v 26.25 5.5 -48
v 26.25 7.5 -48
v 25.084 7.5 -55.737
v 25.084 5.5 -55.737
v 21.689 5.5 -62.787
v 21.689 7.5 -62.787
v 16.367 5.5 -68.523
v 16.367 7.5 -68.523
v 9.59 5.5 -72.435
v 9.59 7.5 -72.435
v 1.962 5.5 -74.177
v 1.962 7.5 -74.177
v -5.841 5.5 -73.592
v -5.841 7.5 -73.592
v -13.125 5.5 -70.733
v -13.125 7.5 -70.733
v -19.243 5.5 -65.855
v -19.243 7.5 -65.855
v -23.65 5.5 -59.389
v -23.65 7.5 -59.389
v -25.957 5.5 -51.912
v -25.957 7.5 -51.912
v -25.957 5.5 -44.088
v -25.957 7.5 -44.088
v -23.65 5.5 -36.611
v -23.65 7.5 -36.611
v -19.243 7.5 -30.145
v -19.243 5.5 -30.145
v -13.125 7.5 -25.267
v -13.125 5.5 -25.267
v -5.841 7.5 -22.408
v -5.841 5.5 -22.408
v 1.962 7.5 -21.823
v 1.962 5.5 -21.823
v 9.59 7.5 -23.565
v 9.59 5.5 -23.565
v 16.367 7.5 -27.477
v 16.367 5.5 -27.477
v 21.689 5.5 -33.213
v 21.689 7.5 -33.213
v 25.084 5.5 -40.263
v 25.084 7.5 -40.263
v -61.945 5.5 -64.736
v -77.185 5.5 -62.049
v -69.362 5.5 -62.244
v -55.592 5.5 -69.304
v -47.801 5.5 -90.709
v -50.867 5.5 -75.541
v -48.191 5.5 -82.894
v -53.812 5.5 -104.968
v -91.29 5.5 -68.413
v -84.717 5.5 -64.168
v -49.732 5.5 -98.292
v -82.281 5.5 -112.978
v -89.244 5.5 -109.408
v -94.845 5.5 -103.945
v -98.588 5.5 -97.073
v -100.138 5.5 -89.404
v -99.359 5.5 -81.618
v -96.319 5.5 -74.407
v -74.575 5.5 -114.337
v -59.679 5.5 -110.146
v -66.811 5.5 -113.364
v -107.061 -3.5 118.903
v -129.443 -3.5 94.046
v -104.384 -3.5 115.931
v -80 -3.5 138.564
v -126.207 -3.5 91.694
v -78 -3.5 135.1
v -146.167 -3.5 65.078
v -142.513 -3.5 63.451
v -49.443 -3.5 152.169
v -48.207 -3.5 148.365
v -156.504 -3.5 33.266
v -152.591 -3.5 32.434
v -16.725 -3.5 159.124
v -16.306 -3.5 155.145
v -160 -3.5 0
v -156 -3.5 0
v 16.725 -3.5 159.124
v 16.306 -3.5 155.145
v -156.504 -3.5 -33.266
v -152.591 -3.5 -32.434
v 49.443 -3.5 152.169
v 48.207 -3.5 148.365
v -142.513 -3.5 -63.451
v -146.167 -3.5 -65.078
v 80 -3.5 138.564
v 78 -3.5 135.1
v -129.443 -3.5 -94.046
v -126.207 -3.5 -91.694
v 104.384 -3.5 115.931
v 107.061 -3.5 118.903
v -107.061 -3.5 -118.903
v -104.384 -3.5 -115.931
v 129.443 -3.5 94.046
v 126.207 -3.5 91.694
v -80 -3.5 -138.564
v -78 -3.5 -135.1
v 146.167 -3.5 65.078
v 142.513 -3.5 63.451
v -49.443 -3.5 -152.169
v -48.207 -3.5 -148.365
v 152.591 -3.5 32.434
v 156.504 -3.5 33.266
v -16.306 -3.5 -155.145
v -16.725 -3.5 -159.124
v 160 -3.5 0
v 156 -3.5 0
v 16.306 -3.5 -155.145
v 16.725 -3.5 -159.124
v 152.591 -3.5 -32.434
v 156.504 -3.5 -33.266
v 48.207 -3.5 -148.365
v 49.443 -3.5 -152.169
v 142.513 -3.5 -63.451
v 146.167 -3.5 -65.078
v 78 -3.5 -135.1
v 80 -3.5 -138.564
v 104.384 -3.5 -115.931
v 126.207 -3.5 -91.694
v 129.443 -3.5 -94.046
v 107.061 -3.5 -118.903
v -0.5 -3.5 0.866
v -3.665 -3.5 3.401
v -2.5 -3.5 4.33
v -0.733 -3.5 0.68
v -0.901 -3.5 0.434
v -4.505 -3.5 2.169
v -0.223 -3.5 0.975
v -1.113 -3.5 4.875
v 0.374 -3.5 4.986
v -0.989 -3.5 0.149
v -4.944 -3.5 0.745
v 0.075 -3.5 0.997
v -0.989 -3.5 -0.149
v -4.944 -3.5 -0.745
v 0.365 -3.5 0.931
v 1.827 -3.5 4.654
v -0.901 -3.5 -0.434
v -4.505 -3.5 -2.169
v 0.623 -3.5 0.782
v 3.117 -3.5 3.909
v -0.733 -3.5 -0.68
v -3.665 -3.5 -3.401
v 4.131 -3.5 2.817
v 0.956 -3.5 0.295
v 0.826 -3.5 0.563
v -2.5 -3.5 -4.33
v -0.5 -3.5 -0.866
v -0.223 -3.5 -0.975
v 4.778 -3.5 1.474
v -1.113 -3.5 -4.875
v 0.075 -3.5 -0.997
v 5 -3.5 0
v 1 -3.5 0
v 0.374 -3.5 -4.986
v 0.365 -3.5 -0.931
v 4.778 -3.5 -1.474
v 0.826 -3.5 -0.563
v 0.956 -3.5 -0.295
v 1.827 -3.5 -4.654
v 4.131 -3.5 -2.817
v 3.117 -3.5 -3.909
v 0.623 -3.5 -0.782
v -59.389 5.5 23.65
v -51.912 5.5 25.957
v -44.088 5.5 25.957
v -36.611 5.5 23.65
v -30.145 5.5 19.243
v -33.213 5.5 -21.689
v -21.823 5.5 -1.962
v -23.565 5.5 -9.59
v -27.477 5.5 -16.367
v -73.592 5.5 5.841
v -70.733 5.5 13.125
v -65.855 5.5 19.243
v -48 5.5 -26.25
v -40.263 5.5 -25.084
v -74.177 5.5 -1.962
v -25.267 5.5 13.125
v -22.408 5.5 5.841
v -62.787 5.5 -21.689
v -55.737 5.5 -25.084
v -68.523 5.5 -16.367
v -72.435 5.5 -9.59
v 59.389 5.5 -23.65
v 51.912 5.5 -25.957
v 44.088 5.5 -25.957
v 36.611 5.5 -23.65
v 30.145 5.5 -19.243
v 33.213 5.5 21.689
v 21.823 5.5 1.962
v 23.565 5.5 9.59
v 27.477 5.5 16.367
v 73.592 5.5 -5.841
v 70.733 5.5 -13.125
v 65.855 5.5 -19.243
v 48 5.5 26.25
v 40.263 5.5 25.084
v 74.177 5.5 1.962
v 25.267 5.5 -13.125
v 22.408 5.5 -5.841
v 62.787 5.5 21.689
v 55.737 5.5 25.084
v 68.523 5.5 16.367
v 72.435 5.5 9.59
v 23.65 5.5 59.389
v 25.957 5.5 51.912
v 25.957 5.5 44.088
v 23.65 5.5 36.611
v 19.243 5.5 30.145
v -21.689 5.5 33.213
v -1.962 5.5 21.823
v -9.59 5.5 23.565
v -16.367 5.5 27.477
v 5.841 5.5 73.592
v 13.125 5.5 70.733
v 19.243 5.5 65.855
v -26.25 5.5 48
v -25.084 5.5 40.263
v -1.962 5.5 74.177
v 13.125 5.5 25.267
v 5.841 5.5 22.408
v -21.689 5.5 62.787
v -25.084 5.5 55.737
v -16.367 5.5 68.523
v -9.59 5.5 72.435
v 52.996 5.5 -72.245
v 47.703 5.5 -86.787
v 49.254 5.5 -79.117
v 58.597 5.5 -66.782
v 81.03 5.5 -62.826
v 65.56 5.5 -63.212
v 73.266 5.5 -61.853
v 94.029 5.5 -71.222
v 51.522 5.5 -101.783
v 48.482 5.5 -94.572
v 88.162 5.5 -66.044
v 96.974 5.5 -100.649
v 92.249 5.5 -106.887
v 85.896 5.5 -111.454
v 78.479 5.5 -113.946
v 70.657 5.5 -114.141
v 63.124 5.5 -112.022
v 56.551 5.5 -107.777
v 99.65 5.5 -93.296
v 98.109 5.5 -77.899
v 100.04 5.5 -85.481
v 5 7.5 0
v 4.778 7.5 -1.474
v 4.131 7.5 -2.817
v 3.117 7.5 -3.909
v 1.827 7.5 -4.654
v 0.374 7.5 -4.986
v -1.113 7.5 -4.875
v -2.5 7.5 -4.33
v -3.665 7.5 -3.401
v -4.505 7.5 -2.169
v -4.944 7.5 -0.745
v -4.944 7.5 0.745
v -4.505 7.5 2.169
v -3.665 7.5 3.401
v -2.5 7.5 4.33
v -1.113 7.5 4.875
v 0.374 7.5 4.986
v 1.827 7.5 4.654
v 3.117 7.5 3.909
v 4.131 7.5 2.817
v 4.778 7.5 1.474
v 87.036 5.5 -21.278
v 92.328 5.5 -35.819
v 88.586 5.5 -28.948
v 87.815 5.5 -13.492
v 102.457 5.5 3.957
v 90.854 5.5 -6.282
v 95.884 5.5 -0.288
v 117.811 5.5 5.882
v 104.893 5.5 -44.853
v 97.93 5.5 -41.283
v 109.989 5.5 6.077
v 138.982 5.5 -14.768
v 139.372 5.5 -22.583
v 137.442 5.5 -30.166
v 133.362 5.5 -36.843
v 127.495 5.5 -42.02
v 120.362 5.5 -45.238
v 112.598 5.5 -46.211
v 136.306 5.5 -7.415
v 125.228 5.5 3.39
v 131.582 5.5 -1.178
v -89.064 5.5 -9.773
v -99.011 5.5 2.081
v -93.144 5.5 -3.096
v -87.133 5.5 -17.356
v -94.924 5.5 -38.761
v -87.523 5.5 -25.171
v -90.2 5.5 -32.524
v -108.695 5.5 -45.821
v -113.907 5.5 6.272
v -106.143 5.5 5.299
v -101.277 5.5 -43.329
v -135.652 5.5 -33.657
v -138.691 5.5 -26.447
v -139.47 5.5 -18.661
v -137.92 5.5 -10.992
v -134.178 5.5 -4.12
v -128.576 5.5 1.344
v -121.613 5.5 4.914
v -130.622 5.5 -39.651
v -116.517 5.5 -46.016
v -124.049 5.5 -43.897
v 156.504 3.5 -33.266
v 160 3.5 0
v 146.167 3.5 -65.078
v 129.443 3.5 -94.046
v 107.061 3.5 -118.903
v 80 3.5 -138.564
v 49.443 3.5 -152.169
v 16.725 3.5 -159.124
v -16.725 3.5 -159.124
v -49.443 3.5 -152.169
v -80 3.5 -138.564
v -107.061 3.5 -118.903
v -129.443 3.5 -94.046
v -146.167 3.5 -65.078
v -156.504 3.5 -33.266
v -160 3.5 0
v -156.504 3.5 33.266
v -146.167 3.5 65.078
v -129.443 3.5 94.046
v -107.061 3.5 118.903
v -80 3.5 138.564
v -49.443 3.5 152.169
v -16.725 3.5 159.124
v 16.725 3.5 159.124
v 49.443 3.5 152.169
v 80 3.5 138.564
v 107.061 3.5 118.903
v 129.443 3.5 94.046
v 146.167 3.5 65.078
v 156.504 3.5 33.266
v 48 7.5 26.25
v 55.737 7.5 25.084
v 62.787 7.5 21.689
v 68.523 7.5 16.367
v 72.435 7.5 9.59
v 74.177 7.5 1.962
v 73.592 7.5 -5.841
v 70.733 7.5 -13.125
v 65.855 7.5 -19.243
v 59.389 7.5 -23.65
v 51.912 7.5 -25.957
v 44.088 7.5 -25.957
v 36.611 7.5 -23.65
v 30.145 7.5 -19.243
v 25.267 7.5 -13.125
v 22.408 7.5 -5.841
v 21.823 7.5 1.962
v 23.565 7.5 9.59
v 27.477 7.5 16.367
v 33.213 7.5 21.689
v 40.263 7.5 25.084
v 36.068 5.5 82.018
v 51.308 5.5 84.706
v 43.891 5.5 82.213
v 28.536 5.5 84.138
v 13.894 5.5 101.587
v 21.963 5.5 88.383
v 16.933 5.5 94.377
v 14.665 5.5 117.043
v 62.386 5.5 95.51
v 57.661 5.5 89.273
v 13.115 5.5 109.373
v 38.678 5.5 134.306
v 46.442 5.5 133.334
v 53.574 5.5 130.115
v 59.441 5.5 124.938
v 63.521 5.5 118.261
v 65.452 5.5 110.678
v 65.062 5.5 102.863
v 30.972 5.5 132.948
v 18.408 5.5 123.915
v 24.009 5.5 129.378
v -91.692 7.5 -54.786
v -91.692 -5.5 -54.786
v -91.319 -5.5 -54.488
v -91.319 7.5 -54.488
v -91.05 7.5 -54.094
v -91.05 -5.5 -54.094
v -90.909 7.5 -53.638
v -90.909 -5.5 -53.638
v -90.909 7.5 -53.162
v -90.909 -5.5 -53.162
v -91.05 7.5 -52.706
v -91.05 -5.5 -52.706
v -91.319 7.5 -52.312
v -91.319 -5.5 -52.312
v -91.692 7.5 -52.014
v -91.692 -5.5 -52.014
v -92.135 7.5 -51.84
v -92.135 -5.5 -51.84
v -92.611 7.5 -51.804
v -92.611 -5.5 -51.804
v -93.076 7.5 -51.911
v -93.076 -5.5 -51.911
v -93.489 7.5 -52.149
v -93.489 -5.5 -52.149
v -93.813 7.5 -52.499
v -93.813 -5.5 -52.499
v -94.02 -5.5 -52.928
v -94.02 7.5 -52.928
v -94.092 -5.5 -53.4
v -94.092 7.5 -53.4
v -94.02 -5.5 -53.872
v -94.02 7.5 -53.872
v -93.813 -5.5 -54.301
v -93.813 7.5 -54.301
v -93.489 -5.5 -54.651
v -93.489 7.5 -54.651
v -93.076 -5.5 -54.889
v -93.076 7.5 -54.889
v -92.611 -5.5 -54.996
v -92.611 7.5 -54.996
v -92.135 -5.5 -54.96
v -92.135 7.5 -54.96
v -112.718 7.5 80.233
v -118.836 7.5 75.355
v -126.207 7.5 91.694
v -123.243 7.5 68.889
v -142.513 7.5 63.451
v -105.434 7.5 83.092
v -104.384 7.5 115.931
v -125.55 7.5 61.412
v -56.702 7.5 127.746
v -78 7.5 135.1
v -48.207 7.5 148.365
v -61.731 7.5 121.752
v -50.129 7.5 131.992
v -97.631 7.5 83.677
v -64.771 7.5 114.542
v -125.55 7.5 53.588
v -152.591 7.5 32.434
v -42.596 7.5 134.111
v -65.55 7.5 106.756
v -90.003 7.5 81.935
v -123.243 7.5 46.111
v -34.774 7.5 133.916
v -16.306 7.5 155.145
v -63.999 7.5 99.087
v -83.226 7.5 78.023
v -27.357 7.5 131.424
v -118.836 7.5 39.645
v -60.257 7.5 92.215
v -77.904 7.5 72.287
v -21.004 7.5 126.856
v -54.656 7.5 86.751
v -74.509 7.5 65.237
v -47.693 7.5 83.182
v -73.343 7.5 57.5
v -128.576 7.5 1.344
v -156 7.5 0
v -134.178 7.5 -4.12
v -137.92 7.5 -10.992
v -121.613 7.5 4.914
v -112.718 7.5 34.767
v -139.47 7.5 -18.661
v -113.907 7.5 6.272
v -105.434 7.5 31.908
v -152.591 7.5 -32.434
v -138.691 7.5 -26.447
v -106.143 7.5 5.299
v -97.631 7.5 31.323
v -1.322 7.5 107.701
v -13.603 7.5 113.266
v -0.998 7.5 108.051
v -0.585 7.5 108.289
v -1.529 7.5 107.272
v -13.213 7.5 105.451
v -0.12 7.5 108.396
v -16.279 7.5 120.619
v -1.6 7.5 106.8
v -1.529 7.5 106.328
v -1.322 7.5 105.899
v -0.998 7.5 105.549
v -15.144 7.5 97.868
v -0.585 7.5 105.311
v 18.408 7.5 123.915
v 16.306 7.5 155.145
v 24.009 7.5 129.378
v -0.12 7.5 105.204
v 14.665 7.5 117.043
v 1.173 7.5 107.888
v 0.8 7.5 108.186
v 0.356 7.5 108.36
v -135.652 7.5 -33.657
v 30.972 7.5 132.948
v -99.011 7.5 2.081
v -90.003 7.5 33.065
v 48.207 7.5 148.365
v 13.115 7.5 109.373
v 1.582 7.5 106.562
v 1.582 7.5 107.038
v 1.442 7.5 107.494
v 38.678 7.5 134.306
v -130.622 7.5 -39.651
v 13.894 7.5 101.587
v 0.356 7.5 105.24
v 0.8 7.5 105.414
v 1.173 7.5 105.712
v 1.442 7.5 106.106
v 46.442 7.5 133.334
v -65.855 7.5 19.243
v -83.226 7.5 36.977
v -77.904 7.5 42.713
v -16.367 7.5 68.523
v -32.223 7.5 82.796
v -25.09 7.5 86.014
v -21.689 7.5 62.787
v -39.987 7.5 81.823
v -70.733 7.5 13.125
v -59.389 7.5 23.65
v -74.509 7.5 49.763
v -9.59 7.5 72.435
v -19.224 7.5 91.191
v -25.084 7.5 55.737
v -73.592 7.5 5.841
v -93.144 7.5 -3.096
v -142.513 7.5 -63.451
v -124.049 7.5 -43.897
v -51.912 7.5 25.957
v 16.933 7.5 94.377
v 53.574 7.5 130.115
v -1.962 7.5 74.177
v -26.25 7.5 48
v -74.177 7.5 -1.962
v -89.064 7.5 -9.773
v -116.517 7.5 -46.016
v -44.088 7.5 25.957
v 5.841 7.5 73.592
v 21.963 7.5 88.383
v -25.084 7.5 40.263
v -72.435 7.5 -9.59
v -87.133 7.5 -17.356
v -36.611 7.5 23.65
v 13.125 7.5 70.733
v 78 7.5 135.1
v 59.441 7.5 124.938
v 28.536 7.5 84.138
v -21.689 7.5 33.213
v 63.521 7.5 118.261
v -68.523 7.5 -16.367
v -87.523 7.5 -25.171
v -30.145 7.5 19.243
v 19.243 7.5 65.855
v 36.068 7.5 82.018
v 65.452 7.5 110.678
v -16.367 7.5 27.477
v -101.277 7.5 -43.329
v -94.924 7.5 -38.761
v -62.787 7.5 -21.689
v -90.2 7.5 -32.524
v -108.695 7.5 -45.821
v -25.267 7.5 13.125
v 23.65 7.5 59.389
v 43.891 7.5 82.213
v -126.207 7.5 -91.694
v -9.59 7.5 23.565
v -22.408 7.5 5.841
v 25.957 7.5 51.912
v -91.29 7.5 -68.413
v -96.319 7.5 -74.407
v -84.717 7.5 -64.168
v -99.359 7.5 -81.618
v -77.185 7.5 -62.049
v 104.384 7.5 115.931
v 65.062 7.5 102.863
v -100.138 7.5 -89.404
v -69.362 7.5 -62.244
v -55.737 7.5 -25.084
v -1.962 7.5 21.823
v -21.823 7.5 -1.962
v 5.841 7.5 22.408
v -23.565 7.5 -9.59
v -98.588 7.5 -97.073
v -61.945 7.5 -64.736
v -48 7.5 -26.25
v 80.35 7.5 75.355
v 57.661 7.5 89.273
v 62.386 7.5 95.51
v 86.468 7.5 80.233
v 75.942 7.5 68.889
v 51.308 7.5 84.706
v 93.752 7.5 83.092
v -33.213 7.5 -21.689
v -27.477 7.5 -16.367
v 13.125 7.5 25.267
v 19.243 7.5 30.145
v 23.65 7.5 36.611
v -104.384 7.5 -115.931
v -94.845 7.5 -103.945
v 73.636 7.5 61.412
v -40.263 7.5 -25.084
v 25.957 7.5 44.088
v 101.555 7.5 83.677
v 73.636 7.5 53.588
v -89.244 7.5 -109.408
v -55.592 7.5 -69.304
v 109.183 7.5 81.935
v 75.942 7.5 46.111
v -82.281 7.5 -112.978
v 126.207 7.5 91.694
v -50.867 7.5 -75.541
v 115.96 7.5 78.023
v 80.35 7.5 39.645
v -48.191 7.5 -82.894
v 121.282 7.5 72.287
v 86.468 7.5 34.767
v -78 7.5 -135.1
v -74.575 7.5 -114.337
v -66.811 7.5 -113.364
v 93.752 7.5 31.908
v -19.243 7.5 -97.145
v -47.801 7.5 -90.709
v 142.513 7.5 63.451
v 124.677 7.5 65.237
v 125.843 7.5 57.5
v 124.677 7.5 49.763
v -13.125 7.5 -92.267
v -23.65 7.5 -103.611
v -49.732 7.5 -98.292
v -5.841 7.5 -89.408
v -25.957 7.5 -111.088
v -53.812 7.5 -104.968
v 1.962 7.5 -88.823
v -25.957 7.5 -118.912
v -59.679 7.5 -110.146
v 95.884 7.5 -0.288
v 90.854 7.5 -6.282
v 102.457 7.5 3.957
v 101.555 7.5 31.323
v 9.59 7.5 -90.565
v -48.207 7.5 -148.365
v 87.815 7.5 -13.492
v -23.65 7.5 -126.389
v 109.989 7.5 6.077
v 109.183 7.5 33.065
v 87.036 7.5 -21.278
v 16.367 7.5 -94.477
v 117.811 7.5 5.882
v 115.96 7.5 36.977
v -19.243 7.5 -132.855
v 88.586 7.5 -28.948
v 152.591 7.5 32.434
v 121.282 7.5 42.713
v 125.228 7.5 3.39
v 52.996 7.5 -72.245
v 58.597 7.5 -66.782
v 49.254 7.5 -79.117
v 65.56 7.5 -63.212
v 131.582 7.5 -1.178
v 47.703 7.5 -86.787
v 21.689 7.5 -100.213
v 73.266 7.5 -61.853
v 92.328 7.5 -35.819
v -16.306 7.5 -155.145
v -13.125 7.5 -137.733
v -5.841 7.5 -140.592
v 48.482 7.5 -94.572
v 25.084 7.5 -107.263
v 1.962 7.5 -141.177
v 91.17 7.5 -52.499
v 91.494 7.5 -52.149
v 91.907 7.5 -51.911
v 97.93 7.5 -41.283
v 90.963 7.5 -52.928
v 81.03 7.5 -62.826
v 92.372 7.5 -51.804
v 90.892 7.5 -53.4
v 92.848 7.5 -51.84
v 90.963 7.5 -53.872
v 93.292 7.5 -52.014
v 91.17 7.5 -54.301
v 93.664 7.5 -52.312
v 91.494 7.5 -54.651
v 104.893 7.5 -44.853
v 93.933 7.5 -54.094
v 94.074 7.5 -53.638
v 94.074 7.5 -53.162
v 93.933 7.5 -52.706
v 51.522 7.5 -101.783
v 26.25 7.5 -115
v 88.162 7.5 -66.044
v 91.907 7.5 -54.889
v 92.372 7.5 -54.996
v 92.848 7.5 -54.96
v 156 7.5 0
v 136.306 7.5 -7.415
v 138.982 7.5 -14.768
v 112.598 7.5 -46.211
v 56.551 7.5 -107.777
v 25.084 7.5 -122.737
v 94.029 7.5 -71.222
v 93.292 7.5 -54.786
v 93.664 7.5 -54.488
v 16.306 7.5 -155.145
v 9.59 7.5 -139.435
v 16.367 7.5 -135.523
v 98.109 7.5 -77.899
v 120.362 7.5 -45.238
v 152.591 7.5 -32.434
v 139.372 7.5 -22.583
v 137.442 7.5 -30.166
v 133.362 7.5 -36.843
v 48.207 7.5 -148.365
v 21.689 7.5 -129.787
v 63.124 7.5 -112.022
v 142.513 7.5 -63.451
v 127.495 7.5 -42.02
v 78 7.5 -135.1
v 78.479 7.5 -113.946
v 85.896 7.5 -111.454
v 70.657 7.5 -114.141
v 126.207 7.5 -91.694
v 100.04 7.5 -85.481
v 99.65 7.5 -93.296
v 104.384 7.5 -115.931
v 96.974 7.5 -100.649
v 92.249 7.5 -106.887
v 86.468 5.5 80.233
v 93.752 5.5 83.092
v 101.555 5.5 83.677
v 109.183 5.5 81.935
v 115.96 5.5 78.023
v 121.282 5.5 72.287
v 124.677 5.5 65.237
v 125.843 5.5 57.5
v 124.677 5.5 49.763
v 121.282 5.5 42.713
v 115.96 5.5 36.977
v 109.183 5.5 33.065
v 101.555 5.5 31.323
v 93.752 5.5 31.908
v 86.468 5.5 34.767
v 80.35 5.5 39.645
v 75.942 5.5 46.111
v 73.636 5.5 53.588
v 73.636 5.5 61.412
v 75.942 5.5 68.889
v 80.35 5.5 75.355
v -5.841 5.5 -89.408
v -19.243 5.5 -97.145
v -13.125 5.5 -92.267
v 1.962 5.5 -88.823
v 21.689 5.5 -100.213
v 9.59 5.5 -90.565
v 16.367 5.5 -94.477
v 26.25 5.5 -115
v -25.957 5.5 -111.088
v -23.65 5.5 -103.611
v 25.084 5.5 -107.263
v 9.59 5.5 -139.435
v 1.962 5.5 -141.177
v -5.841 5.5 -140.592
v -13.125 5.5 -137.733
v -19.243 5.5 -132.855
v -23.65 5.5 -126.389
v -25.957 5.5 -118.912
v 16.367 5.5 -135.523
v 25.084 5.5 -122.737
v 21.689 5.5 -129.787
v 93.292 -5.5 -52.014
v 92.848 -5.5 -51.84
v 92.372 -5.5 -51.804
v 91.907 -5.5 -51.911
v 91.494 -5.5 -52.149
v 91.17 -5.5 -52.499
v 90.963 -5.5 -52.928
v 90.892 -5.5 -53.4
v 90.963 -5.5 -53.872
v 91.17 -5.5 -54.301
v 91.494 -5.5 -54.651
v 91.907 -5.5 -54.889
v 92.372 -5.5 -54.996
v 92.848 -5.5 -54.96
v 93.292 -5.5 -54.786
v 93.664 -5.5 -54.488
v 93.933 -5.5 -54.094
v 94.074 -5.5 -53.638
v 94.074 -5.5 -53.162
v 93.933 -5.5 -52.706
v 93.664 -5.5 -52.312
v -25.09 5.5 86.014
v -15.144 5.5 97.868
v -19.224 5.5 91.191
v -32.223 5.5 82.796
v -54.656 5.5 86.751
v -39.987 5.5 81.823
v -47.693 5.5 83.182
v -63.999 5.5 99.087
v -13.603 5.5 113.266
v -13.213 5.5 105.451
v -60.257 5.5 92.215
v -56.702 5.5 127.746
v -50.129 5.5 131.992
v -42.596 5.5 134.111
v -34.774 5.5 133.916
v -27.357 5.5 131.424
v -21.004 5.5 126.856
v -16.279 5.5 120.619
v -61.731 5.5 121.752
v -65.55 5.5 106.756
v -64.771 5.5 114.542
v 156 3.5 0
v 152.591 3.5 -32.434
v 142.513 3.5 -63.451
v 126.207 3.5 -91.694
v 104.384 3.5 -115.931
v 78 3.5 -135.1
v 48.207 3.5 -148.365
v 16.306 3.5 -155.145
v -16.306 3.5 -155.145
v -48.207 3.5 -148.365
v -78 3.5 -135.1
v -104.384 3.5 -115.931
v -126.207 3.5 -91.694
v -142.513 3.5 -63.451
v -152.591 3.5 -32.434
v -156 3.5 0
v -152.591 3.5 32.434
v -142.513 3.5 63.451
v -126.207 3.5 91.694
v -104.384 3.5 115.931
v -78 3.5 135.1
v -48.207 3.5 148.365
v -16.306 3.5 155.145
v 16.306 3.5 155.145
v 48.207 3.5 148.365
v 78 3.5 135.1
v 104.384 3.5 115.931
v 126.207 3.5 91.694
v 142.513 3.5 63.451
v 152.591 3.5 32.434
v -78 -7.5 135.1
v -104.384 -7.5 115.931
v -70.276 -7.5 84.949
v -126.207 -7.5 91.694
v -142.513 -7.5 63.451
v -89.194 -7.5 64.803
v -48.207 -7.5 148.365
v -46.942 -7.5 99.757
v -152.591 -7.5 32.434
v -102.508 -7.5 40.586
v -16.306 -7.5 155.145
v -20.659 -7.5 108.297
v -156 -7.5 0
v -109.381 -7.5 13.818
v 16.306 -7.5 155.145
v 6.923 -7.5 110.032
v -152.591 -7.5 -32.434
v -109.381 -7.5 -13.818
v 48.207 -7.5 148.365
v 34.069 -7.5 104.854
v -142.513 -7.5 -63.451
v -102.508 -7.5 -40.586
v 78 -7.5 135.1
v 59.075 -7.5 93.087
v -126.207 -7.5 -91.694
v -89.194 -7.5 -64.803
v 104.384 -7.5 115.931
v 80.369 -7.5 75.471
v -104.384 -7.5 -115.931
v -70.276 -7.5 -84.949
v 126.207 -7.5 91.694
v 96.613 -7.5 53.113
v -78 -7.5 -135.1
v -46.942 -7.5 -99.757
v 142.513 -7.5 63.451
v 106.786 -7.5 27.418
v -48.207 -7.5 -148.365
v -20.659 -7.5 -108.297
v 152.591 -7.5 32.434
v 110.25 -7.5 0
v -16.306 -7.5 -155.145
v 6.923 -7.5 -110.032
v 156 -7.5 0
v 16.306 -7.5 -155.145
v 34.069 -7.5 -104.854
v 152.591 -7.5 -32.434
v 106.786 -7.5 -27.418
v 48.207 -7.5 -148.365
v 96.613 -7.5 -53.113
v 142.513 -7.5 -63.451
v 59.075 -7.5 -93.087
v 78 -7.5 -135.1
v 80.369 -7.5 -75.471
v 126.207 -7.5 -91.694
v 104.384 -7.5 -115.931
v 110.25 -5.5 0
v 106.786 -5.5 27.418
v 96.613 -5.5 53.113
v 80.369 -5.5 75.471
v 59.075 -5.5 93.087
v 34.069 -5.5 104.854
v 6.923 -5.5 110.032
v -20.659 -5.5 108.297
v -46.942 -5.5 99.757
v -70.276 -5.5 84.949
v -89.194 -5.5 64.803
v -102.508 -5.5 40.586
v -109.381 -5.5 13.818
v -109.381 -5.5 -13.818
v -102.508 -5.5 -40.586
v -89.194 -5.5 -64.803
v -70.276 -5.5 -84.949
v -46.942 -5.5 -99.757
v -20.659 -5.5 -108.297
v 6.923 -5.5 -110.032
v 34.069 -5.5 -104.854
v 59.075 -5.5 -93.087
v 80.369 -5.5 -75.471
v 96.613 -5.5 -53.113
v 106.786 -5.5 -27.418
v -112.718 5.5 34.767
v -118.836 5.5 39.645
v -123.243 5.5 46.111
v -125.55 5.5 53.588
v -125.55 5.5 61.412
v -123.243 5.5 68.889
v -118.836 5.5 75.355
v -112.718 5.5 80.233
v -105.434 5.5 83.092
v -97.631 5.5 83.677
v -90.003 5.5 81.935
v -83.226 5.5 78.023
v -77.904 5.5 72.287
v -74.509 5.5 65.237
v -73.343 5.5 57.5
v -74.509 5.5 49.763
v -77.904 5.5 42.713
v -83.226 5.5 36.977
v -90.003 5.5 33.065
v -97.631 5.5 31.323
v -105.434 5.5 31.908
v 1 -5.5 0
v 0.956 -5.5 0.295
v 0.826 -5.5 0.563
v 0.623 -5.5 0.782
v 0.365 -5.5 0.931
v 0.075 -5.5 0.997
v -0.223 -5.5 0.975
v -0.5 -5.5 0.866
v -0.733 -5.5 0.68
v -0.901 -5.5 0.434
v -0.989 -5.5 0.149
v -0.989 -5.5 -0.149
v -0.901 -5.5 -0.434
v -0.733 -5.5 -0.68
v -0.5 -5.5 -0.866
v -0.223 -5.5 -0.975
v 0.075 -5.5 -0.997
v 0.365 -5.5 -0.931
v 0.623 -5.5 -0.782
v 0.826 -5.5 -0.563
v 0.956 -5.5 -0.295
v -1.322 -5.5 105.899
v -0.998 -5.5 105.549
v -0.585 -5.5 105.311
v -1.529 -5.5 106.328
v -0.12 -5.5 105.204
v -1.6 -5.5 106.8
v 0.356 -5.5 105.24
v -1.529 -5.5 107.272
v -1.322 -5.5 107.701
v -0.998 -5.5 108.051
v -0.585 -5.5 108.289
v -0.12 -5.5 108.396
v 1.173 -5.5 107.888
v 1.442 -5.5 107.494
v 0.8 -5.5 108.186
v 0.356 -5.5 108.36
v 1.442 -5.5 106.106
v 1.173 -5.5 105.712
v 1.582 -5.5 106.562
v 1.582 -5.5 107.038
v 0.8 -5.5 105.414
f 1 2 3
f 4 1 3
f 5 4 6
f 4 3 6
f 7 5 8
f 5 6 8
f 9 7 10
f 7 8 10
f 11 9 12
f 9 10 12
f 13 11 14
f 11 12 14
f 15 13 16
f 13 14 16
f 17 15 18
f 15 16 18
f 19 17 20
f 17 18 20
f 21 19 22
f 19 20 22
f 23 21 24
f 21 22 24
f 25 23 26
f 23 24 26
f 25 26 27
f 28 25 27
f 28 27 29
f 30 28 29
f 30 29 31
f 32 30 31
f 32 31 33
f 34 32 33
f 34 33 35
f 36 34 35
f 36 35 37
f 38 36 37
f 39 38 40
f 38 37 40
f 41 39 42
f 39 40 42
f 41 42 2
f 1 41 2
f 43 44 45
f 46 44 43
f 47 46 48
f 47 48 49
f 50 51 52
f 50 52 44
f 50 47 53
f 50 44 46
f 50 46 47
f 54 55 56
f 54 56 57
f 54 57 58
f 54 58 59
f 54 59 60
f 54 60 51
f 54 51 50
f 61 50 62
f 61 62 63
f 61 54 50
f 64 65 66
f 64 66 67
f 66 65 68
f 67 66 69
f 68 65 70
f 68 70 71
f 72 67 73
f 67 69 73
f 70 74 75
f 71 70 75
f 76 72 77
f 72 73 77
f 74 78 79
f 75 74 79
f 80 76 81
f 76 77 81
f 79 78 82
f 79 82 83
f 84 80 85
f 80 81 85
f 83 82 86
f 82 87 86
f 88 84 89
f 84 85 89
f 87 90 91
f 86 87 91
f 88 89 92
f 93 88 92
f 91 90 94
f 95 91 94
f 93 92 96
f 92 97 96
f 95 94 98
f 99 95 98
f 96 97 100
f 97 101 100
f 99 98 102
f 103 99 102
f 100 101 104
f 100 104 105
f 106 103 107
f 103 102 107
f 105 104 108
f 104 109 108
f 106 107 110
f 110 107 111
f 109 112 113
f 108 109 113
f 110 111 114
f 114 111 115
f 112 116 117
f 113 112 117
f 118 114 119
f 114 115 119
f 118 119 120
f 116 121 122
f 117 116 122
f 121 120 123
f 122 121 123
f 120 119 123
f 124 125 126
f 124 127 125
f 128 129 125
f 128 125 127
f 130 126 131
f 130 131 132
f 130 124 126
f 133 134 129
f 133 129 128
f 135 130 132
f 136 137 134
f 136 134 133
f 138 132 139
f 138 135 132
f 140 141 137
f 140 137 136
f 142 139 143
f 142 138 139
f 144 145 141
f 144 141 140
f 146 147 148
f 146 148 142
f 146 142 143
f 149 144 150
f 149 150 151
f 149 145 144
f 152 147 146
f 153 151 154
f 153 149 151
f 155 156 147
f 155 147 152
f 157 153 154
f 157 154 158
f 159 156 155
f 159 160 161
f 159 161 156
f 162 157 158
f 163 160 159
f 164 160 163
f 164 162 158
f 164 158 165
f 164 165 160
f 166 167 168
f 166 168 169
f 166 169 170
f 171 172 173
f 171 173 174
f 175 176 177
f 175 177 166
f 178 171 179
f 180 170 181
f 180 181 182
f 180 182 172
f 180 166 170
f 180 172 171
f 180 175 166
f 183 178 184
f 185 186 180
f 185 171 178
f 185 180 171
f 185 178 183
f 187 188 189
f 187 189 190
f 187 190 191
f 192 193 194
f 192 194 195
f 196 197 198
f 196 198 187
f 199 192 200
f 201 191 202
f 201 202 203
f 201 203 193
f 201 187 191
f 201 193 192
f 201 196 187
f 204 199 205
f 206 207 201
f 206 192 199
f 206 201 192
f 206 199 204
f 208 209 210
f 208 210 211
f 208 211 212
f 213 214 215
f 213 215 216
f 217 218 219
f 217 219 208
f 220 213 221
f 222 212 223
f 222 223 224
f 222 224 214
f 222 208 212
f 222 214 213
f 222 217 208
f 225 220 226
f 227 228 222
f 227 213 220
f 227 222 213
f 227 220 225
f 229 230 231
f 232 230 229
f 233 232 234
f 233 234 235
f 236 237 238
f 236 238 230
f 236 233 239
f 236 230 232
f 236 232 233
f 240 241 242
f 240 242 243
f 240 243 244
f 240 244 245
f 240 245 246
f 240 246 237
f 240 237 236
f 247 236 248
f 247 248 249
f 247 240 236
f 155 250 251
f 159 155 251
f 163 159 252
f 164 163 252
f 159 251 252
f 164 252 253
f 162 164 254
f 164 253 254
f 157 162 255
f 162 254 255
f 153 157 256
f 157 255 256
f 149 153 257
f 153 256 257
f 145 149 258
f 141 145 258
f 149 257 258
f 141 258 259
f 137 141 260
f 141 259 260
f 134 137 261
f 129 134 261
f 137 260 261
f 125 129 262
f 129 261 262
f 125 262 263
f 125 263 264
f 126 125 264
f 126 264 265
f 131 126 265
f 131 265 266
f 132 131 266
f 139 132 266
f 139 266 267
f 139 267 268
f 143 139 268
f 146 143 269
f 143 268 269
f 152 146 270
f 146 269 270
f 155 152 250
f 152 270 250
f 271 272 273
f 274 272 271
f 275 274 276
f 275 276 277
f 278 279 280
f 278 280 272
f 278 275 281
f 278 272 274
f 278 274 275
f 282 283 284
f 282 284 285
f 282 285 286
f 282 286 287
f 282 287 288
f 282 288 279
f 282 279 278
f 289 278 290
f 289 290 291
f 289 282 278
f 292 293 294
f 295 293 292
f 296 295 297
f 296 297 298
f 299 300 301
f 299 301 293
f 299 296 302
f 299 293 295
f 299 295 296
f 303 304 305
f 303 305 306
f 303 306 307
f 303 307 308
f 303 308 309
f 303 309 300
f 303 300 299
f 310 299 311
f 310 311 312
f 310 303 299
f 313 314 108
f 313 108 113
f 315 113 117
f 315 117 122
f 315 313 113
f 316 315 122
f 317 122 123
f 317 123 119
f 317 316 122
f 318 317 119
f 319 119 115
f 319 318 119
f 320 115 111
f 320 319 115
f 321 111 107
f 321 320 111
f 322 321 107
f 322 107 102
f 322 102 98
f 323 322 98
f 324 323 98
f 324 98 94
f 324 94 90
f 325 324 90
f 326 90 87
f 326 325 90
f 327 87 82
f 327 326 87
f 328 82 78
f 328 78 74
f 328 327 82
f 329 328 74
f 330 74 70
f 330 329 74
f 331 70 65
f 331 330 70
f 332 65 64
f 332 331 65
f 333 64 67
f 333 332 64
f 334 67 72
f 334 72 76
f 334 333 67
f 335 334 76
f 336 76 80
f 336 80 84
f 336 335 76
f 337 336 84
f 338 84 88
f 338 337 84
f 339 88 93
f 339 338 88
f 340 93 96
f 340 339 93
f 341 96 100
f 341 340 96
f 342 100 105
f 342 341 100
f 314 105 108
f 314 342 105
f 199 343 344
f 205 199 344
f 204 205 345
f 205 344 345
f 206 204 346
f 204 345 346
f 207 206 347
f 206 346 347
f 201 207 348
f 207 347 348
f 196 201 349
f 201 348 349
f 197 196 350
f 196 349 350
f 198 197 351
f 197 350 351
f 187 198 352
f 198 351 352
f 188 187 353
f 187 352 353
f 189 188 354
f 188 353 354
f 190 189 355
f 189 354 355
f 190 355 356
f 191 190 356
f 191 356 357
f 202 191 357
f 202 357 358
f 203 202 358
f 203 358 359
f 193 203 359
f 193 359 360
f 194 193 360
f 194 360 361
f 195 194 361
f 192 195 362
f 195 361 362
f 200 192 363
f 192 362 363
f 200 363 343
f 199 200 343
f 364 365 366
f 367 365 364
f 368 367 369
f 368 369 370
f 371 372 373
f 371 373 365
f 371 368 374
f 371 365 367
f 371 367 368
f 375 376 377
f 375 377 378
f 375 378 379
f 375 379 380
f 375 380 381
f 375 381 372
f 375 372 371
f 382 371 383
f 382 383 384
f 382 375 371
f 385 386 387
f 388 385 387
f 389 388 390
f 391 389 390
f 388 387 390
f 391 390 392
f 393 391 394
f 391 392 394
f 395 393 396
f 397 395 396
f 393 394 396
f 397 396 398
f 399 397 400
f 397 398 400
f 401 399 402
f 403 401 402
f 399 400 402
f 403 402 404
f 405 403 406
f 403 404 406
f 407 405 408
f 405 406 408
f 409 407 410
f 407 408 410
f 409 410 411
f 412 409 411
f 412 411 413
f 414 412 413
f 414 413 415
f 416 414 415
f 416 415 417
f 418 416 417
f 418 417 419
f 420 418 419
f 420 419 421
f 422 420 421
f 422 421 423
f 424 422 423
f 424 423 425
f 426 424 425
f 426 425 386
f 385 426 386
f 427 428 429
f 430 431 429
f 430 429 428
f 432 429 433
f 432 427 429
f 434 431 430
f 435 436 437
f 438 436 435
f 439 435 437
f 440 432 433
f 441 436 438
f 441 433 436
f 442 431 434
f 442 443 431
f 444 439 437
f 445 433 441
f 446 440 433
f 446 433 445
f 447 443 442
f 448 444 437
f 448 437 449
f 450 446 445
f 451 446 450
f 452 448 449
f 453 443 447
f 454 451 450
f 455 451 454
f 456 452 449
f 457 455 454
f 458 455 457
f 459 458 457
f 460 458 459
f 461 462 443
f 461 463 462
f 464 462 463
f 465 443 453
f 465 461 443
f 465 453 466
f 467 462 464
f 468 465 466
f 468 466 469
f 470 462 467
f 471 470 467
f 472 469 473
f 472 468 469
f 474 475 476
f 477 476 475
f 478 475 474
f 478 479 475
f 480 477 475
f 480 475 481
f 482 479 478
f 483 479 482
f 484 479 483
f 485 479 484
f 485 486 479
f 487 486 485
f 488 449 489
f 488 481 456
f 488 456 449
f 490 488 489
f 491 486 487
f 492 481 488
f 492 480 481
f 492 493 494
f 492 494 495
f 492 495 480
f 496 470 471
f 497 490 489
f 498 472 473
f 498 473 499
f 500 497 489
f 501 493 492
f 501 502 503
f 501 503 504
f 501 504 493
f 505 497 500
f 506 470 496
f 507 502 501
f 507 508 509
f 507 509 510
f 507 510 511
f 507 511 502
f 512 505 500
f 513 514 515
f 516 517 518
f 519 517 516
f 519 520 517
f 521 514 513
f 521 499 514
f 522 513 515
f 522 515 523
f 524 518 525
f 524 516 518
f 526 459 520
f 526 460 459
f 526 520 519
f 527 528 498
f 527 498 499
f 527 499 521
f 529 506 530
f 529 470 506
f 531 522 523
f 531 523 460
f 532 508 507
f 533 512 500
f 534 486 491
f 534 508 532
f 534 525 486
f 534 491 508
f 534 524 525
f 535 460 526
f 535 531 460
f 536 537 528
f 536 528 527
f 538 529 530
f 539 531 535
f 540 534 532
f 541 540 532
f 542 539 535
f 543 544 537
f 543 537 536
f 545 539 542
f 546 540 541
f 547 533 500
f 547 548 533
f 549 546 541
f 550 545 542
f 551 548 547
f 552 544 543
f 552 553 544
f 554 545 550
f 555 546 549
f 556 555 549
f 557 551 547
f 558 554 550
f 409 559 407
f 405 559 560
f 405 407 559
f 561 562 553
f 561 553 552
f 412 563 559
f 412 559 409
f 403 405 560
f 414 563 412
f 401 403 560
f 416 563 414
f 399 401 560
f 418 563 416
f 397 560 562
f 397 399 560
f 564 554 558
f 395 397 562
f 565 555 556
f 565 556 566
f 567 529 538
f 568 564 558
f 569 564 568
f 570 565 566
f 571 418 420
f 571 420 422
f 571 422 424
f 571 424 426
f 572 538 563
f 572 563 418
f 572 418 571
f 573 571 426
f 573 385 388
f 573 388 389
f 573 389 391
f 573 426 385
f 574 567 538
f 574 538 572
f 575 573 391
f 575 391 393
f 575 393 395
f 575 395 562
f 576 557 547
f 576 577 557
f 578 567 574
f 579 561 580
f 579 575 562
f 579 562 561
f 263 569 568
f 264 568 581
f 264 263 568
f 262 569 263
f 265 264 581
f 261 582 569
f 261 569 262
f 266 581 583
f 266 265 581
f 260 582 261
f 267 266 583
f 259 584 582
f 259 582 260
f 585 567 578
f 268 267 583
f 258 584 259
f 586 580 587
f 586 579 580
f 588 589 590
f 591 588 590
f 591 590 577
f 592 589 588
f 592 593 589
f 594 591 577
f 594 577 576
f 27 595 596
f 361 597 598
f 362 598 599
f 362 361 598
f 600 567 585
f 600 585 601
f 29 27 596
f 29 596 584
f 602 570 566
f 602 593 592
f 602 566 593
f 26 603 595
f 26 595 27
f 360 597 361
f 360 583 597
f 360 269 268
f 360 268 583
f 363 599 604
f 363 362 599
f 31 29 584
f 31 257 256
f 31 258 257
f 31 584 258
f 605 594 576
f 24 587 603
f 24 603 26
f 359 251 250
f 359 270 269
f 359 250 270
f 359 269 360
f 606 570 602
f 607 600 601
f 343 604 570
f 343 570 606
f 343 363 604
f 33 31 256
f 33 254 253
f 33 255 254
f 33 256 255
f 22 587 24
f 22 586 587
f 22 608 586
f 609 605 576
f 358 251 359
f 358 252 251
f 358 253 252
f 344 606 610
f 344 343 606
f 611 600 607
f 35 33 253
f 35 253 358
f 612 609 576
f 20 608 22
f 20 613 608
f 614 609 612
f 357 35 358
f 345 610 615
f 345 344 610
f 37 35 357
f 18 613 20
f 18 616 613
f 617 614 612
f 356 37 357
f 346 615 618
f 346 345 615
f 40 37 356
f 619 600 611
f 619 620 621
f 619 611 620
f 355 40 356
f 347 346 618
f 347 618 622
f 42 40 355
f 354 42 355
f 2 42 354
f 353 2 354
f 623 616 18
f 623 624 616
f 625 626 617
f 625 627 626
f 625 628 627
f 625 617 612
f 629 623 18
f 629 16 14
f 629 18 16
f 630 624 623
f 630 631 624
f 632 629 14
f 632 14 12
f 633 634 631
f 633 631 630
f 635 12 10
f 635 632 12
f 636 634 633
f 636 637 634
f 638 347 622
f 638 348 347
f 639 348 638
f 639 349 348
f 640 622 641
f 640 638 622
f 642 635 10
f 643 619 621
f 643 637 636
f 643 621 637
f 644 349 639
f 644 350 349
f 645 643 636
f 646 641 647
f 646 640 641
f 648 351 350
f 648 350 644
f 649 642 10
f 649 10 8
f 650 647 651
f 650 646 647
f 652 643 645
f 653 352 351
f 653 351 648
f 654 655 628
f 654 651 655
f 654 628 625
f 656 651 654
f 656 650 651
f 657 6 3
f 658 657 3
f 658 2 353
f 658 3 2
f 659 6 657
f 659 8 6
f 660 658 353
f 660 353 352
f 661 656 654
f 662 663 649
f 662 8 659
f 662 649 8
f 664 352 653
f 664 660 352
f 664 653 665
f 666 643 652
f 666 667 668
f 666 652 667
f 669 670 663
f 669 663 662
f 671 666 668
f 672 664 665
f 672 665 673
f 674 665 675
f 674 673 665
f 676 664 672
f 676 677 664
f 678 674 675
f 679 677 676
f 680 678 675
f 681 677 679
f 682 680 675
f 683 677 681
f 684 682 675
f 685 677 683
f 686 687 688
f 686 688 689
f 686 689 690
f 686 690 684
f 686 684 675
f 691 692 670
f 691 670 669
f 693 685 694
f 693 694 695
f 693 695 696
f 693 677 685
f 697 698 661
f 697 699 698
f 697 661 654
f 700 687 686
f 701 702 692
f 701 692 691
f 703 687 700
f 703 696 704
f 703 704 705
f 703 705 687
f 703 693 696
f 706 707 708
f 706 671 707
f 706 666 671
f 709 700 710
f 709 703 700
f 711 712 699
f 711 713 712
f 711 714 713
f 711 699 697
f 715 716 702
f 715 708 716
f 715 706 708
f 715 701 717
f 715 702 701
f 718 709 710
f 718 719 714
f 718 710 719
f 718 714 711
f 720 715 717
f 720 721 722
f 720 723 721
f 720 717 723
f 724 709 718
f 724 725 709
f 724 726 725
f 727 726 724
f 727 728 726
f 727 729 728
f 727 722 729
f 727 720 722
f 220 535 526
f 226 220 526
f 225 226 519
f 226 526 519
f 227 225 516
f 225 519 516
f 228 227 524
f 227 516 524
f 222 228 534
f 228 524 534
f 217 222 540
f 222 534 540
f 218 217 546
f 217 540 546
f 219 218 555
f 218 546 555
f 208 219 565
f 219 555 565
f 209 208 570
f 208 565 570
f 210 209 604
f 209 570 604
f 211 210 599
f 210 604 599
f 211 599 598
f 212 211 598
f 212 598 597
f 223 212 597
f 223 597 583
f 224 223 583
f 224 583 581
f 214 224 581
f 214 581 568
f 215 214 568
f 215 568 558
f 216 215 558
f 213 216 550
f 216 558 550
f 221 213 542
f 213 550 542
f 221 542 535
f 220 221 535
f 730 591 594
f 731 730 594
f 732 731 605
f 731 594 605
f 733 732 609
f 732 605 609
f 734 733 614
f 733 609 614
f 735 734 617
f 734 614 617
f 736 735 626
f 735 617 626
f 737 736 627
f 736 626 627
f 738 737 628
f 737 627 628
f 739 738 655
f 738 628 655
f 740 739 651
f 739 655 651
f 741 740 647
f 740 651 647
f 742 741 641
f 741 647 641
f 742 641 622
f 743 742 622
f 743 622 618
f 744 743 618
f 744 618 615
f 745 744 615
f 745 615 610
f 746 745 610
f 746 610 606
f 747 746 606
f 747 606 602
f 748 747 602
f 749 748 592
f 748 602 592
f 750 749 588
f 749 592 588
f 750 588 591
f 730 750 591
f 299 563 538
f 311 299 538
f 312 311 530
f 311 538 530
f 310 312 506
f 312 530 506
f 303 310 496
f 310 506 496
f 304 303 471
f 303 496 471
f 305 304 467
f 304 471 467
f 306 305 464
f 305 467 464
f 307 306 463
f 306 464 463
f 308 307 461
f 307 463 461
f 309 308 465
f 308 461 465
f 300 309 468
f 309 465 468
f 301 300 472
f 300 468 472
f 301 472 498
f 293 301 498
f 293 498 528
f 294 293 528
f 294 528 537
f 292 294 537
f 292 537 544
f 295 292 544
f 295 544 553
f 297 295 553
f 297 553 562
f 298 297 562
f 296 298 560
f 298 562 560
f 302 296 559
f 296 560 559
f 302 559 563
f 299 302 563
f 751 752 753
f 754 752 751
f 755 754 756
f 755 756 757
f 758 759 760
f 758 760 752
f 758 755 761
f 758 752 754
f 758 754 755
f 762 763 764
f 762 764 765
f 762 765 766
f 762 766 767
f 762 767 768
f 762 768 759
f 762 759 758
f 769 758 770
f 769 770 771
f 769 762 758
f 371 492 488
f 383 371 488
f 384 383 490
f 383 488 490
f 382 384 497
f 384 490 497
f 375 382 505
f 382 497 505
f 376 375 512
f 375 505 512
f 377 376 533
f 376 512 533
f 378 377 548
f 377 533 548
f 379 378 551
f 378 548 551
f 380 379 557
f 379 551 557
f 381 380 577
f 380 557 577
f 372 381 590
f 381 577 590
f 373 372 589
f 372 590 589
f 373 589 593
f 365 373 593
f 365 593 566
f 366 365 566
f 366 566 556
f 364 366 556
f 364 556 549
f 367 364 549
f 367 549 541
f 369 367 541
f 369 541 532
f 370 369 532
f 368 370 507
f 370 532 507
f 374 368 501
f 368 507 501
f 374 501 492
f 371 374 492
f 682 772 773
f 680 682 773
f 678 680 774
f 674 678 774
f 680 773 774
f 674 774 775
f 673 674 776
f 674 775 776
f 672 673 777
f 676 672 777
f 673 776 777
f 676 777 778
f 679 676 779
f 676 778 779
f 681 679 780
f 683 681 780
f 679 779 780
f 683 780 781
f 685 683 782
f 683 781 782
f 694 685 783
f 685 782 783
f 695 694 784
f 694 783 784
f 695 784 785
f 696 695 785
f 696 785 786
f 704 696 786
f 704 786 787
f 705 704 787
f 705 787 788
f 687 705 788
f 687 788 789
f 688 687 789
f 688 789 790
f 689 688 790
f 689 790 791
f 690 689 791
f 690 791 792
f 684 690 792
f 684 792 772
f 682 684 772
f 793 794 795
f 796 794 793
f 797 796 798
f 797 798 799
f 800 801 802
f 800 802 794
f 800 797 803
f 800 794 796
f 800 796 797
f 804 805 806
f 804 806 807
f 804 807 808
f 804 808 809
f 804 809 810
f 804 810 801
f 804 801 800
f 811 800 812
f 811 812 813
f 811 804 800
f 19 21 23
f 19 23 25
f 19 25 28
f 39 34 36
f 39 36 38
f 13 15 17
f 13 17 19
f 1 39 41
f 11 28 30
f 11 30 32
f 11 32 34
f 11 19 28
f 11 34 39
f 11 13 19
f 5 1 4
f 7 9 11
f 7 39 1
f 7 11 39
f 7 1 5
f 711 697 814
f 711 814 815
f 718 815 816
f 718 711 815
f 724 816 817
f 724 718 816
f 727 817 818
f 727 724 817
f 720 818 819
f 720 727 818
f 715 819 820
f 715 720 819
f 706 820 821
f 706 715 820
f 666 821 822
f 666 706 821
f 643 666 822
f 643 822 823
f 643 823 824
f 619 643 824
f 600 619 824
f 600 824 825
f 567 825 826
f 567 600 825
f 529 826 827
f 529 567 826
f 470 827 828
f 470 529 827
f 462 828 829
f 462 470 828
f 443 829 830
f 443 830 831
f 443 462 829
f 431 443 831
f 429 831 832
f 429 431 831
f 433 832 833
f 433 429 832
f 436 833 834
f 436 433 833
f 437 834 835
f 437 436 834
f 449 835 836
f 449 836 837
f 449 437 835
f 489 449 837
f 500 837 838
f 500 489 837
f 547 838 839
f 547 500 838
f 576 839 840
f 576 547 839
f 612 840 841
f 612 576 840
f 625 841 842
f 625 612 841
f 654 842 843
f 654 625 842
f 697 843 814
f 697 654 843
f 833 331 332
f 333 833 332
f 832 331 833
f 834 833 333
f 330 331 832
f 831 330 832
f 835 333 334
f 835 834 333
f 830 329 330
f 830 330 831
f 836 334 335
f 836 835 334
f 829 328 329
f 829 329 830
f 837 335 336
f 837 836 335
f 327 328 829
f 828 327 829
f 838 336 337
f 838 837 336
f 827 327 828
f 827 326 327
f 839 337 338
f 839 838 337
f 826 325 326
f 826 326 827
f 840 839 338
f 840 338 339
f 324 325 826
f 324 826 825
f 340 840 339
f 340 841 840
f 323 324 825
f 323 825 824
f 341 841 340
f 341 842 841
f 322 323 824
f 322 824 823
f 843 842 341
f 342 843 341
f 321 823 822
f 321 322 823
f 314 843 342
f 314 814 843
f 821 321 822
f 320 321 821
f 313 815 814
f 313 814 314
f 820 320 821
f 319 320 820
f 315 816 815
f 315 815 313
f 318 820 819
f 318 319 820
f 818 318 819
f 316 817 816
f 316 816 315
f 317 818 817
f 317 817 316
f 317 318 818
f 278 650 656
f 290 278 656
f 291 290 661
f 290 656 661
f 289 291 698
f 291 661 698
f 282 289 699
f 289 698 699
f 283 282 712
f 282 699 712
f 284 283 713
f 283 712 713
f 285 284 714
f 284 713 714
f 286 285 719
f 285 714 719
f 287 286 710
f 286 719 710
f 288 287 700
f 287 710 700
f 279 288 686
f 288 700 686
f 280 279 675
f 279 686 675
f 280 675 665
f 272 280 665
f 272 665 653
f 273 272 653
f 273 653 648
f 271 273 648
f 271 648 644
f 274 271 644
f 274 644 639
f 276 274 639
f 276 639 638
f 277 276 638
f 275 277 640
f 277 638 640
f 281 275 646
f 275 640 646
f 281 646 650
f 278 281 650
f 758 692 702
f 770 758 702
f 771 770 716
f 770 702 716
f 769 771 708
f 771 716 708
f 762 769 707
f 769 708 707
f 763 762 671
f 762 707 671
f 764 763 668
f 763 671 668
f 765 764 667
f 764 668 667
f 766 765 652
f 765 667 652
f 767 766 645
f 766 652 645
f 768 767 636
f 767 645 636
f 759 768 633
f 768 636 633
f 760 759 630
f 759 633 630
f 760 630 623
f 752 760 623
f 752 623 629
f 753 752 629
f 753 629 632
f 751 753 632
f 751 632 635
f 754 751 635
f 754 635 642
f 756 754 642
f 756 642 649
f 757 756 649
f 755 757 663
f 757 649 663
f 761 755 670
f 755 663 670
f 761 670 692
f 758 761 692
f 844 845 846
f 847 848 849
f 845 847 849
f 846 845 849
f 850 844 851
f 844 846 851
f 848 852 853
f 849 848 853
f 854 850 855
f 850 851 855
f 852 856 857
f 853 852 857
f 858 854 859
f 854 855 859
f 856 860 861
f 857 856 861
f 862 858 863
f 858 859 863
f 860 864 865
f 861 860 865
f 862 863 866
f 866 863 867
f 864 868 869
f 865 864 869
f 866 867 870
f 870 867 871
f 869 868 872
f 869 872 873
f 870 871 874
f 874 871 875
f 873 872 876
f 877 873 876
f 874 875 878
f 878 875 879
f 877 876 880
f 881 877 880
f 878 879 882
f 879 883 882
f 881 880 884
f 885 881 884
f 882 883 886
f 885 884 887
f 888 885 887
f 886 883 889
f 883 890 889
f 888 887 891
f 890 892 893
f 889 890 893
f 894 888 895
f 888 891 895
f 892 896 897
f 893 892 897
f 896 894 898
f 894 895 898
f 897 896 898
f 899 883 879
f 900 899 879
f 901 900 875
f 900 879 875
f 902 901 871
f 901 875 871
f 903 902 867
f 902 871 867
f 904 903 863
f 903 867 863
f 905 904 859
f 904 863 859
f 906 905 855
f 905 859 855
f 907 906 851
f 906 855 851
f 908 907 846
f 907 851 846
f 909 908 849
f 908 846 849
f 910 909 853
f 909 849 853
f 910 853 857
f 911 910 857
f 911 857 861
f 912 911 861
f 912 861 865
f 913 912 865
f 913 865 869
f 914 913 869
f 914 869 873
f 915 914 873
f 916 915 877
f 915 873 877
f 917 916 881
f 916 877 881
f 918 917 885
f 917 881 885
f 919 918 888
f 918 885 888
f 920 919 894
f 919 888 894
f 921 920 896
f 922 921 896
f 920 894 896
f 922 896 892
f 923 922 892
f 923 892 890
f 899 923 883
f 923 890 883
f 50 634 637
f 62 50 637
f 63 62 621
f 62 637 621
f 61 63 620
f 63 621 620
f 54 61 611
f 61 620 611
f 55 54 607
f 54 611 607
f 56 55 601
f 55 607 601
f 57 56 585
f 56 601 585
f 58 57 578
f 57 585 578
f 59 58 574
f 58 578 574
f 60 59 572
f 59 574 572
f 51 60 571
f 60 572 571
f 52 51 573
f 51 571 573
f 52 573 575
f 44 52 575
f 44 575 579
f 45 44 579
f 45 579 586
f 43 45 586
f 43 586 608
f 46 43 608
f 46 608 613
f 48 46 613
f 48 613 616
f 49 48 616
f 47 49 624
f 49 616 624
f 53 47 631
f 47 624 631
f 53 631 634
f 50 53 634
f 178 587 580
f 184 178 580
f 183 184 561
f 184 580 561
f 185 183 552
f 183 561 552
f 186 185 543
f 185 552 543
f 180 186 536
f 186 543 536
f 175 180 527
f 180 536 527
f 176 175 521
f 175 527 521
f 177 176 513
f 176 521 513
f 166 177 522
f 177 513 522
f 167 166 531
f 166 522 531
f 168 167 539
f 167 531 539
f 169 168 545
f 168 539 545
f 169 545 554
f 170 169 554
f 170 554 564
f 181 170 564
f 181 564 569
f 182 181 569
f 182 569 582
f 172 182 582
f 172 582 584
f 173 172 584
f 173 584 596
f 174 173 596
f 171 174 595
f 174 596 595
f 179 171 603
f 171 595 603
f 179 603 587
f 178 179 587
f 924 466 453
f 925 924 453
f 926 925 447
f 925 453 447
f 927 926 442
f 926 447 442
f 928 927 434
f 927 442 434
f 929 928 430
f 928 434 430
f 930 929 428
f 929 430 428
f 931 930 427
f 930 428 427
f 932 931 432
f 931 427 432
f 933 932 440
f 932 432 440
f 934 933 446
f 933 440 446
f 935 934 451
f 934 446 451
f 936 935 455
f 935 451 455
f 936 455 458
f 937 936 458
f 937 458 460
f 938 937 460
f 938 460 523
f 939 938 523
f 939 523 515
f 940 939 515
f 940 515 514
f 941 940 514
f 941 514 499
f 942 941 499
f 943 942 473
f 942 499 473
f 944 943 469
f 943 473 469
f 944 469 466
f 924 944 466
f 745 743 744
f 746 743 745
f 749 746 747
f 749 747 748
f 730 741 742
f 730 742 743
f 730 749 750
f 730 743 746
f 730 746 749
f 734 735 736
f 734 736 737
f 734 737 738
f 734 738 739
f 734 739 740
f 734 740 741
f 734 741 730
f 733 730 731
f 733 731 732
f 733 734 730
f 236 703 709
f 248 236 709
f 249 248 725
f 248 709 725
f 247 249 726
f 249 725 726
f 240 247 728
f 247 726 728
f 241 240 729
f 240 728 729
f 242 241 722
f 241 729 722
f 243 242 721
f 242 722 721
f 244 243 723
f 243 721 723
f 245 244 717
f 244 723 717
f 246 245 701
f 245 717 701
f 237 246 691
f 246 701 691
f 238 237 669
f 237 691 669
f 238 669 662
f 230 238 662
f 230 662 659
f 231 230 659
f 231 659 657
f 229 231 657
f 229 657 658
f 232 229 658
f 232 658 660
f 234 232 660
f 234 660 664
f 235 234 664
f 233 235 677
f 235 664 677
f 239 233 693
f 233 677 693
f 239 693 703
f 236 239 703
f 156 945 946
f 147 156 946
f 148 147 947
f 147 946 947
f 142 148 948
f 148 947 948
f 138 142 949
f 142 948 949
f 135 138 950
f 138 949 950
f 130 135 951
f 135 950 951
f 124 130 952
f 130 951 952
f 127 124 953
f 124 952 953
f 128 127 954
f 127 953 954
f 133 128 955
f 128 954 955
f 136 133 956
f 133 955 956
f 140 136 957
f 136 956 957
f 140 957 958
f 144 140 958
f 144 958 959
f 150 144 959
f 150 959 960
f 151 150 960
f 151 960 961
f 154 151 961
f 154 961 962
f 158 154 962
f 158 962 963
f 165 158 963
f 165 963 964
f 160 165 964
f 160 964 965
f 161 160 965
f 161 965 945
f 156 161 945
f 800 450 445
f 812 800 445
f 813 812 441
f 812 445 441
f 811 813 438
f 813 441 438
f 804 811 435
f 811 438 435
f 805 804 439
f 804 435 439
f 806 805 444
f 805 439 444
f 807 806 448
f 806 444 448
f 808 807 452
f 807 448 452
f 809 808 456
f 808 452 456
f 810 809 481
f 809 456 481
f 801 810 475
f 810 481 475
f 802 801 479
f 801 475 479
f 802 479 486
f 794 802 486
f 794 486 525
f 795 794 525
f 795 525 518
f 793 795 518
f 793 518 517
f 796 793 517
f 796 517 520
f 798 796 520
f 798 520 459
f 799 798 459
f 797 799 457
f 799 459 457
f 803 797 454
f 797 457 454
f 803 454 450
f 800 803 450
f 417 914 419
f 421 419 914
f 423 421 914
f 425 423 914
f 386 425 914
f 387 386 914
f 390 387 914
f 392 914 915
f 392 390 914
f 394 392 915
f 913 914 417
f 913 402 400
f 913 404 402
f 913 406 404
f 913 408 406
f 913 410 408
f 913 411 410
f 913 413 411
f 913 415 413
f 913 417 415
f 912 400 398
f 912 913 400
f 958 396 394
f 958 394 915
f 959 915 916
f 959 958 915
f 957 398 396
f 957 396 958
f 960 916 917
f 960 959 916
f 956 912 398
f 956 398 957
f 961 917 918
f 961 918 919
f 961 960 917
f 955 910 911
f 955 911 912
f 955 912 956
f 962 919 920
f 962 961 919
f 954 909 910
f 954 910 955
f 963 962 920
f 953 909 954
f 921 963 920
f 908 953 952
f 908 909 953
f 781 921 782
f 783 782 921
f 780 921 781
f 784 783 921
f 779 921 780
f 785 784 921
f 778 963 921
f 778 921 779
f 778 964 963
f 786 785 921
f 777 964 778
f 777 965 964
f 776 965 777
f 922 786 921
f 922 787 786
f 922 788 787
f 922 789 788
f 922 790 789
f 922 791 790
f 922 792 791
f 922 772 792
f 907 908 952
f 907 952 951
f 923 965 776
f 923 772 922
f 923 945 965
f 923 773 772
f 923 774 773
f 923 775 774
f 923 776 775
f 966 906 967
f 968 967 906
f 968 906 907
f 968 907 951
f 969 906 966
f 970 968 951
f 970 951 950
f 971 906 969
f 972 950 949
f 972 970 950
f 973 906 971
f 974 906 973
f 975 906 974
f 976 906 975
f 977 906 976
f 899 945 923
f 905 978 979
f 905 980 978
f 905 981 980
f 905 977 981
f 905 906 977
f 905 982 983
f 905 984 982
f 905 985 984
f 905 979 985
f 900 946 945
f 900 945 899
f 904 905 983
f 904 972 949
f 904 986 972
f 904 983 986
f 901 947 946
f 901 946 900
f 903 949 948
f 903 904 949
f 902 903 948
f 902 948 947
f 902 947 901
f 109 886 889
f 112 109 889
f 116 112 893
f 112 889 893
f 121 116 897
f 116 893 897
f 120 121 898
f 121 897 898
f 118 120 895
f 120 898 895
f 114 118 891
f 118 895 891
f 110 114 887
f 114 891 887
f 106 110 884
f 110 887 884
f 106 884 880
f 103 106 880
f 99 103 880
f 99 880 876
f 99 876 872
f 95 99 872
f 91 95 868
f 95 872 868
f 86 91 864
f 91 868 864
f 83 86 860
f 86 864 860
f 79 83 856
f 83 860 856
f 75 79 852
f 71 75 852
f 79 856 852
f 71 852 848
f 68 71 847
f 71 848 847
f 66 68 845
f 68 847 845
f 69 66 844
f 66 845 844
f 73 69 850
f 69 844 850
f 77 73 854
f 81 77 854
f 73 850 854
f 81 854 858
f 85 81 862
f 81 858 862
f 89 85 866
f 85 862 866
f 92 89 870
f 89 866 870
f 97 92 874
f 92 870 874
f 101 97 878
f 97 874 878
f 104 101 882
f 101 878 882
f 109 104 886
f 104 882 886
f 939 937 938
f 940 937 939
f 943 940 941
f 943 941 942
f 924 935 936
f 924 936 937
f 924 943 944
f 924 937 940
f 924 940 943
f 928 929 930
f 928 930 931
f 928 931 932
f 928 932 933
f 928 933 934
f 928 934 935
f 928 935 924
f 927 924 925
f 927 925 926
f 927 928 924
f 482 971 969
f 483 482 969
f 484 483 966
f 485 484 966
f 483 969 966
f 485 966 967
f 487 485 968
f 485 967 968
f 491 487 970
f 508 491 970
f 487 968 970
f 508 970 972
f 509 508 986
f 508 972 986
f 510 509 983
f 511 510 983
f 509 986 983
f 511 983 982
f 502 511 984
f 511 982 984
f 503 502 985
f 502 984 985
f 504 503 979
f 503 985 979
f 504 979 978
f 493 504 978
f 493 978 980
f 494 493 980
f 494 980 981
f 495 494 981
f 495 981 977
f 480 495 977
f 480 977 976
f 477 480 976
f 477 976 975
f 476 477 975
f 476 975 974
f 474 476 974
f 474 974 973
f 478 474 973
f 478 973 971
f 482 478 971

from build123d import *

# Parameters (mm, degrees)
ESQUISSE1_R                  = 160
BOSS_EXTRU_1_DEPTH           = 7.5
ESQUISSE2_R                  = 110.25
ENL_V_MAT_EXTRU_1_DEPTH      = 2
ESQUISSE3_R                  = 1.6
ENL_V_MAT_EXTRU_2_DEPTH      = 14
R_P_TITION_CIRCULAIRE1_COUNT = 3
ESQUISSE4_R                  = 1
ENL_V_MAT_EXTRU_3_DEPTH      = 14
ESQUISSE10_R                 = 5
ENL_V_MAT_EXTRU_6_DEPTH      = 11
ESQUISSE11_R                 = 160
ESQUISSE11_R_2               = 156
ENL_V_MAT_EXTRU_7_DEPTH      = 4
ESQUISSE8_R                  = 26.25
ENL_V_MAT_EXTRU_4_DEPTH      = 2
R_P_TITION_CIRCULAIRE2_COUNT = 9
ESQUISSE9_R                  = 26.25
ENL_V_MAT_EXTRU_5_DEPTH      = 2
R_P_TITION_CIRCULAIRE3_COUNT = 4


with BuildPart() as part:
    # Esquisse1 → Boss.-Extru.1 (new body, symmetric)
    with BuildSketch(Plane(origin=(0, 0, 0), x_dir=(1, 0, 0), z_dir=(0, 1, 0))):
        Circle(ESQUISSE1_R)
    extrude(amount=BOSS_EXTRU_1_DEPTH, both=True)

    # Esquisse2 → Enlèv. mat.-Extru.1 (cut)
    with BuildSketch(Plane.XZ.offset(7.5)):
        Circle(ESQUISSE2_R)
    extrude(amount=-ENL_V_MAT_EXTRU_1_DEPTH, mode=Mode.SUBTRACT)

    # Esquisse3 → Enlèv. mat.-Extru.2 (cut, through all)
    with BuildSketch(Plane(origin=(0, -5.5, 0), x_dir=(-1, 0, 0), z_dir=(0, -1, 0))):
        with Locations((0, -106.8)):
            Circle(ESQUISSE3_R)
    enl_v_mat_extru_2 = extrude(amount=-ENL_V_MAT_EXTRU_2_DEPTH, mode=Mode.SUBTRACT)

    # Répétition circulaire1: Enlèv. mat.-Extru.2 ×3 about axis
    r_p_tition_circulaire1_axis = Axis((0, 0, 0), (0, 1, 0))
    for i in range(1, R_P_TITION_CIRCULAIRE1_COUNT):
        add(enl_v_mat_extru_2.rotate(r_p_tition_circulaire1_axis, i * 360 / R_P_TITION_CIRCULAIRE1_COUNT), mode=Mode.SUBTRACT)

    # Esquisse4 → Enlèv. mat.-Extru.3 (cut, through all)
    with BuildSketch(Plane.XZ.offset(5.5)):
        Circle(ESQUISSE4_R)
    extrude(amount=-ENL_V_MAT_EXTRU_3_DEPTH, mode=Mode.SUBTRACT)

    # Esquisse10 → Enlèv. mat.-Extru.6 (cut)
    with BuildSketch(Plane(origin=(0, 7.5, 0), x_dir=(1, 0, 0), z_dir=(0, 1, 0))):
        Circle(ESQUISSE10_R)
    extrude(amount=-ENL_V_MAT_EXTRU_6_DEPTH, mode=Mode.SUBTRACT)

    # Esquisse11 → Enlèv. mat.-Extru.7 (cut)
    with BuildSketch(Plane(origin=(0, -7.5, 0), x_dir=(1, 0, 0), z_dir=(0, 1, 0))):
        Circle(ESQUISSE11_R)
        Circle(ESQUISSE11_R_2, mode=Mode.SUBTRACT)
    enl_v_mat_extru_7 = extrude(amount=ENL_V_MAT_EXTRU_7_DEPTH, mode=Mode.SUBTRACT)

    # Symétrie1: Enlèv. mat.-Extru.7 across plane
    add(enl_v_mat_extru_7.mirror(Plane.ZX), mode=Mode.SUBTRACT)

    # Esquisse8 → Enlèv. mat.-Extru.4 (cut)
    with BuildSketch(Plane(origin=(0, 7.5, 0), x_dir=(1, 0, 0), z_dir=(0, 1, 0))):
        with Locations((0, 115)):
            Circle(ESQUISSE8_R)
    enl_v_mat_extru_4 = extrude(amount=-ENL_V_MAT_EXTRU_4_DEPTH, mode=Mode.SUBTRACT)

    # Répétition circulaire2: Enlèv. mat.-Extru.4 ×9 about axis
    r_p_tition_circulaire2_axis = Axis((0, 0, 0), (0, 1, 0))
    for i in range(1, R_P_TITION_CIRCULAIRE2_COUNT):
        add(enl_v_mat_extru_4.rotate(r_p_tition_circulaire2_axis, i * 360 / R_P_TITION_CIRCULAIRE2_COUNT), mode=Mode.SUBTRACT)

    # Esquisse9 → Enlèv. mat.-Extru.5 (cut)
    with BuildSketch(Plane(origin=(0, 7.5, 0), x_dir=(1, 0, 0), z_dir=(0, 1, 0))):
        with Locations((0, 48)):
            Circle(ESQUISSE9_R)
    enl_v_mat_extru_5 = extrude(amount=-ENL_V_MAT_EXTRU_5_DEPTH, mode=Mode.SUBTRACT)

    # Répétition circulaire3: Enlèv. mat.-Extru.5 ×4 about axis
    r_p_tition_circulaire3_axis = Axis((0, 0, 0), (0, 1, 0))
    for i in range(1, R_P_TITION_CIRCULAIRE3_COUNT):
        add(enl_v_mat_extru_5.rotate(r_p_tition_circulaire3_axis, i * 360 / R_P_TITION_CIRCULAIRE3_COUNT), mode=Mode.SUBTRACT)


solid = part.part
